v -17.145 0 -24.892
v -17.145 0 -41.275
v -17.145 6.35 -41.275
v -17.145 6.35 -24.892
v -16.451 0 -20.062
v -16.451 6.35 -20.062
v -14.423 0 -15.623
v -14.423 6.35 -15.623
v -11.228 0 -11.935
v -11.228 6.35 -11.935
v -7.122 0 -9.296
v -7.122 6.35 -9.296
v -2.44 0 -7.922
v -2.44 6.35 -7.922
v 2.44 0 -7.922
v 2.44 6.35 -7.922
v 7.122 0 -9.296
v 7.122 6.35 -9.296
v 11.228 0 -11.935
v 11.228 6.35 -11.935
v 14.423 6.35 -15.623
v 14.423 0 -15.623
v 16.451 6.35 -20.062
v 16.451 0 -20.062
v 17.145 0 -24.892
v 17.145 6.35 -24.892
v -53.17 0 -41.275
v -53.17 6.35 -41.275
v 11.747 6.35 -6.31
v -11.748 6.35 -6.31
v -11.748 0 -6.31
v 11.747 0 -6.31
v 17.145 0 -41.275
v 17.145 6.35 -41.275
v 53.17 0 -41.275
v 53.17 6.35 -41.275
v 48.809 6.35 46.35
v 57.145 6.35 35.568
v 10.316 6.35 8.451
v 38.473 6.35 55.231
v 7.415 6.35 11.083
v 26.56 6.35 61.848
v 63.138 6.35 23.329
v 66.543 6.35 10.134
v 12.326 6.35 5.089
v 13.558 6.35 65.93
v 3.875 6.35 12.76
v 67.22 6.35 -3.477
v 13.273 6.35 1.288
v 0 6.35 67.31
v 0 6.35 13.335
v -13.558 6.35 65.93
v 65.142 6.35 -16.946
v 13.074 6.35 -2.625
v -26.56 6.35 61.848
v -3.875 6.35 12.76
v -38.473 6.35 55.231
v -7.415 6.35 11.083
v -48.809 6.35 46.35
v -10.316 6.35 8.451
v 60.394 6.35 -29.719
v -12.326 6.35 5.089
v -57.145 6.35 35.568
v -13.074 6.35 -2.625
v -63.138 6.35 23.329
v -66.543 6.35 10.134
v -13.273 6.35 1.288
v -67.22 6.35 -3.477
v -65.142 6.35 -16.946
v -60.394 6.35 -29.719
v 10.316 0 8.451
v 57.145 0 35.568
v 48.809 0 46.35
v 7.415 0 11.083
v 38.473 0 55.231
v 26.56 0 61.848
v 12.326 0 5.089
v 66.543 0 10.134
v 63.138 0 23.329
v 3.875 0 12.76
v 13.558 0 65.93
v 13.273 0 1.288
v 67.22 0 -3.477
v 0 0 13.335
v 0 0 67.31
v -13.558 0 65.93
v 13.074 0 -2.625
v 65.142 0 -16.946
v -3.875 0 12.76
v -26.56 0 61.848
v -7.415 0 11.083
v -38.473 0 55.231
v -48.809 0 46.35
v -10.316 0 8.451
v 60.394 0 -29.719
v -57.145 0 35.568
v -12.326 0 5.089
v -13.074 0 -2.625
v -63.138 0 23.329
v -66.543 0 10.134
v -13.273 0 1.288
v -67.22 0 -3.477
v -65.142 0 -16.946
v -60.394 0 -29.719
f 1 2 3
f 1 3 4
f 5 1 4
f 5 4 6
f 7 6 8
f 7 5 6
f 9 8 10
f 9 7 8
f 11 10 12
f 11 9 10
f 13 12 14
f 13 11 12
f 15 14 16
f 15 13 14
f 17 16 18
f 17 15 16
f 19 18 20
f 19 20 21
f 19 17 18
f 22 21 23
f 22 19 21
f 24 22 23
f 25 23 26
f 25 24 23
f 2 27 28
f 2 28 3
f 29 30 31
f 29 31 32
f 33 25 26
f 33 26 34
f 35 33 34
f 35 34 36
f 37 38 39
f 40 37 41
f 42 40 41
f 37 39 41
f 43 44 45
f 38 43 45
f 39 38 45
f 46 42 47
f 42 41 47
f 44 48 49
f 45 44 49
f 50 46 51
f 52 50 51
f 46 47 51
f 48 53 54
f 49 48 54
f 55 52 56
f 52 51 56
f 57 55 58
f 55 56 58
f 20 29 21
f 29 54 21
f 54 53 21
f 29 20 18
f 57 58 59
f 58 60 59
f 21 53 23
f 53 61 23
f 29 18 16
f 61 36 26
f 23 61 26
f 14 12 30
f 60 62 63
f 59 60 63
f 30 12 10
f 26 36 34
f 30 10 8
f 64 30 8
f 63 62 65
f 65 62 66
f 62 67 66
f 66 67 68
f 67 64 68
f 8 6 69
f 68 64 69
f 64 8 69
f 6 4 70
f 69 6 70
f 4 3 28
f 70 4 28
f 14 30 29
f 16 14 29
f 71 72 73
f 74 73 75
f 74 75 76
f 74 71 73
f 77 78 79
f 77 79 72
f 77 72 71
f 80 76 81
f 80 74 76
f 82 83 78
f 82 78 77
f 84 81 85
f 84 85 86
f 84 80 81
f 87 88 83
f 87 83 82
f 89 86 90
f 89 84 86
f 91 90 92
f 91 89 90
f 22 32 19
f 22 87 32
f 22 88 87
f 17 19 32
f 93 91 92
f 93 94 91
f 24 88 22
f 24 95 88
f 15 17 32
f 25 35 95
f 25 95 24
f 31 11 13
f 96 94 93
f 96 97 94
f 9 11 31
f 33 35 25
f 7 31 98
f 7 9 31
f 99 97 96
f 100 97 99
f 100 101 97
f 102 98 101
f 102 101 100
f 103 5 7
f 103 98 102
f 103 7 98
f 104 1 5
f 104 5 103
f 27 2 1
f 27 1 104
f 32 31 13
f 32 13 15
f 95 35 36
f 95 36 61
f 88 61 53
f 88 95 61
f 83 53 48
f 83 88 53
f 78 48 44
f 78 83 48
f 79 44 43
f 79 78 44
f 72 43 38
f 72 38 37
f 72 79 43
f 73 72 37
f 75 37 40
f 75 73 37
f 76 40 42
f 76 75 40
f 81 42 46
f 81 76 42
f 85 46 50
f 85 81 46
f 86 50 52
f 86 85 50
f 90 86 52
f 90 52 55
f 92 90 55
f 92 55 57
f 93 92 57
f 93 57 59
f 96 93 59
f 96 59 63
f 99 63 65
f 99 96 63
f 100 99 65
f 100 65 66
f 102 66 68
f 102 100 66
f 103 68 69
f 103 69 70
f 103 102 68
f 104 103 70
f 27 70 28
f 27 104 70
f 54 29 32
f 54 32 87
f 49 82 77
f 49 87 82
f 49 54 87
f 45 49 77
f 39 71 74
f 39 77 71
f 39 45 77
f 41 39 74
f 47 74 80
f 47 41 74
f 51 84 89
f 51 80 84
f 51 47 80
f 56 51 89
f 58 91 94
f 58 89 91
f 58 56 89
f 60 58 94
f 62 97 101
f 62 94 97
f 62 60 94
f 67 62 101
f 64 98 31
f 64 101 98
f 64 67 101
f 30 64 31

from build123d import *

# Parameters (mm, degrees)
BOSS_EXTRUDE1_DEPTH = 6.35
CUT_EXTRUDE1_DEPTH  = 96.402278275


with BuildPart() as part:
    # Sketch2 → Boss-Extrude1 (new body)
    with BuildSketch(Plane(origin=(0, 0, 0), x_dir=(1, 0, 0), z_dir=(0, 1, 0))):
        with BuildLine():
            Line((-53.169638658, 41.275), (-17.145, 41.275))
            Line((-17.145, 41.275), (-17.145, 24.892))
            ThreePointArc((-17.145, 24.892), (0, 7.747), (17.145, 24.892))
            Line((17.145, 24.892), (17.145, 41.275))
            Line((17.145, 41.275), (53.169638658, 41.275))
            ThreePointArc((53.169638658, 41.275), (0, -67.31), (-53.169638658, 41.275))
        make_face()
    extrude(amount=BOSS_EXTRUDE1_DEPTH)

    # Sketch3 → Cut-Extrude1 (cut, through all)
    with BuildSketch(Plane(origin=(0, 6.35, 0), x_dir=(1, 0, 0), z_dir=(0, 1, 0))):
        with BuildLine():
            Line((-11.7475, 6.310187695), (11.7475, 6.310187695))
            ThreePointArc((11.7475, 6.310187695), (0, -13.335), (-11.7475, 6.310187695))
        make_face()
    extrude(amount=-CUT_EXTRUDE1_DEPTH, mode=Mode.SUBTRACT)


solid = part.part
